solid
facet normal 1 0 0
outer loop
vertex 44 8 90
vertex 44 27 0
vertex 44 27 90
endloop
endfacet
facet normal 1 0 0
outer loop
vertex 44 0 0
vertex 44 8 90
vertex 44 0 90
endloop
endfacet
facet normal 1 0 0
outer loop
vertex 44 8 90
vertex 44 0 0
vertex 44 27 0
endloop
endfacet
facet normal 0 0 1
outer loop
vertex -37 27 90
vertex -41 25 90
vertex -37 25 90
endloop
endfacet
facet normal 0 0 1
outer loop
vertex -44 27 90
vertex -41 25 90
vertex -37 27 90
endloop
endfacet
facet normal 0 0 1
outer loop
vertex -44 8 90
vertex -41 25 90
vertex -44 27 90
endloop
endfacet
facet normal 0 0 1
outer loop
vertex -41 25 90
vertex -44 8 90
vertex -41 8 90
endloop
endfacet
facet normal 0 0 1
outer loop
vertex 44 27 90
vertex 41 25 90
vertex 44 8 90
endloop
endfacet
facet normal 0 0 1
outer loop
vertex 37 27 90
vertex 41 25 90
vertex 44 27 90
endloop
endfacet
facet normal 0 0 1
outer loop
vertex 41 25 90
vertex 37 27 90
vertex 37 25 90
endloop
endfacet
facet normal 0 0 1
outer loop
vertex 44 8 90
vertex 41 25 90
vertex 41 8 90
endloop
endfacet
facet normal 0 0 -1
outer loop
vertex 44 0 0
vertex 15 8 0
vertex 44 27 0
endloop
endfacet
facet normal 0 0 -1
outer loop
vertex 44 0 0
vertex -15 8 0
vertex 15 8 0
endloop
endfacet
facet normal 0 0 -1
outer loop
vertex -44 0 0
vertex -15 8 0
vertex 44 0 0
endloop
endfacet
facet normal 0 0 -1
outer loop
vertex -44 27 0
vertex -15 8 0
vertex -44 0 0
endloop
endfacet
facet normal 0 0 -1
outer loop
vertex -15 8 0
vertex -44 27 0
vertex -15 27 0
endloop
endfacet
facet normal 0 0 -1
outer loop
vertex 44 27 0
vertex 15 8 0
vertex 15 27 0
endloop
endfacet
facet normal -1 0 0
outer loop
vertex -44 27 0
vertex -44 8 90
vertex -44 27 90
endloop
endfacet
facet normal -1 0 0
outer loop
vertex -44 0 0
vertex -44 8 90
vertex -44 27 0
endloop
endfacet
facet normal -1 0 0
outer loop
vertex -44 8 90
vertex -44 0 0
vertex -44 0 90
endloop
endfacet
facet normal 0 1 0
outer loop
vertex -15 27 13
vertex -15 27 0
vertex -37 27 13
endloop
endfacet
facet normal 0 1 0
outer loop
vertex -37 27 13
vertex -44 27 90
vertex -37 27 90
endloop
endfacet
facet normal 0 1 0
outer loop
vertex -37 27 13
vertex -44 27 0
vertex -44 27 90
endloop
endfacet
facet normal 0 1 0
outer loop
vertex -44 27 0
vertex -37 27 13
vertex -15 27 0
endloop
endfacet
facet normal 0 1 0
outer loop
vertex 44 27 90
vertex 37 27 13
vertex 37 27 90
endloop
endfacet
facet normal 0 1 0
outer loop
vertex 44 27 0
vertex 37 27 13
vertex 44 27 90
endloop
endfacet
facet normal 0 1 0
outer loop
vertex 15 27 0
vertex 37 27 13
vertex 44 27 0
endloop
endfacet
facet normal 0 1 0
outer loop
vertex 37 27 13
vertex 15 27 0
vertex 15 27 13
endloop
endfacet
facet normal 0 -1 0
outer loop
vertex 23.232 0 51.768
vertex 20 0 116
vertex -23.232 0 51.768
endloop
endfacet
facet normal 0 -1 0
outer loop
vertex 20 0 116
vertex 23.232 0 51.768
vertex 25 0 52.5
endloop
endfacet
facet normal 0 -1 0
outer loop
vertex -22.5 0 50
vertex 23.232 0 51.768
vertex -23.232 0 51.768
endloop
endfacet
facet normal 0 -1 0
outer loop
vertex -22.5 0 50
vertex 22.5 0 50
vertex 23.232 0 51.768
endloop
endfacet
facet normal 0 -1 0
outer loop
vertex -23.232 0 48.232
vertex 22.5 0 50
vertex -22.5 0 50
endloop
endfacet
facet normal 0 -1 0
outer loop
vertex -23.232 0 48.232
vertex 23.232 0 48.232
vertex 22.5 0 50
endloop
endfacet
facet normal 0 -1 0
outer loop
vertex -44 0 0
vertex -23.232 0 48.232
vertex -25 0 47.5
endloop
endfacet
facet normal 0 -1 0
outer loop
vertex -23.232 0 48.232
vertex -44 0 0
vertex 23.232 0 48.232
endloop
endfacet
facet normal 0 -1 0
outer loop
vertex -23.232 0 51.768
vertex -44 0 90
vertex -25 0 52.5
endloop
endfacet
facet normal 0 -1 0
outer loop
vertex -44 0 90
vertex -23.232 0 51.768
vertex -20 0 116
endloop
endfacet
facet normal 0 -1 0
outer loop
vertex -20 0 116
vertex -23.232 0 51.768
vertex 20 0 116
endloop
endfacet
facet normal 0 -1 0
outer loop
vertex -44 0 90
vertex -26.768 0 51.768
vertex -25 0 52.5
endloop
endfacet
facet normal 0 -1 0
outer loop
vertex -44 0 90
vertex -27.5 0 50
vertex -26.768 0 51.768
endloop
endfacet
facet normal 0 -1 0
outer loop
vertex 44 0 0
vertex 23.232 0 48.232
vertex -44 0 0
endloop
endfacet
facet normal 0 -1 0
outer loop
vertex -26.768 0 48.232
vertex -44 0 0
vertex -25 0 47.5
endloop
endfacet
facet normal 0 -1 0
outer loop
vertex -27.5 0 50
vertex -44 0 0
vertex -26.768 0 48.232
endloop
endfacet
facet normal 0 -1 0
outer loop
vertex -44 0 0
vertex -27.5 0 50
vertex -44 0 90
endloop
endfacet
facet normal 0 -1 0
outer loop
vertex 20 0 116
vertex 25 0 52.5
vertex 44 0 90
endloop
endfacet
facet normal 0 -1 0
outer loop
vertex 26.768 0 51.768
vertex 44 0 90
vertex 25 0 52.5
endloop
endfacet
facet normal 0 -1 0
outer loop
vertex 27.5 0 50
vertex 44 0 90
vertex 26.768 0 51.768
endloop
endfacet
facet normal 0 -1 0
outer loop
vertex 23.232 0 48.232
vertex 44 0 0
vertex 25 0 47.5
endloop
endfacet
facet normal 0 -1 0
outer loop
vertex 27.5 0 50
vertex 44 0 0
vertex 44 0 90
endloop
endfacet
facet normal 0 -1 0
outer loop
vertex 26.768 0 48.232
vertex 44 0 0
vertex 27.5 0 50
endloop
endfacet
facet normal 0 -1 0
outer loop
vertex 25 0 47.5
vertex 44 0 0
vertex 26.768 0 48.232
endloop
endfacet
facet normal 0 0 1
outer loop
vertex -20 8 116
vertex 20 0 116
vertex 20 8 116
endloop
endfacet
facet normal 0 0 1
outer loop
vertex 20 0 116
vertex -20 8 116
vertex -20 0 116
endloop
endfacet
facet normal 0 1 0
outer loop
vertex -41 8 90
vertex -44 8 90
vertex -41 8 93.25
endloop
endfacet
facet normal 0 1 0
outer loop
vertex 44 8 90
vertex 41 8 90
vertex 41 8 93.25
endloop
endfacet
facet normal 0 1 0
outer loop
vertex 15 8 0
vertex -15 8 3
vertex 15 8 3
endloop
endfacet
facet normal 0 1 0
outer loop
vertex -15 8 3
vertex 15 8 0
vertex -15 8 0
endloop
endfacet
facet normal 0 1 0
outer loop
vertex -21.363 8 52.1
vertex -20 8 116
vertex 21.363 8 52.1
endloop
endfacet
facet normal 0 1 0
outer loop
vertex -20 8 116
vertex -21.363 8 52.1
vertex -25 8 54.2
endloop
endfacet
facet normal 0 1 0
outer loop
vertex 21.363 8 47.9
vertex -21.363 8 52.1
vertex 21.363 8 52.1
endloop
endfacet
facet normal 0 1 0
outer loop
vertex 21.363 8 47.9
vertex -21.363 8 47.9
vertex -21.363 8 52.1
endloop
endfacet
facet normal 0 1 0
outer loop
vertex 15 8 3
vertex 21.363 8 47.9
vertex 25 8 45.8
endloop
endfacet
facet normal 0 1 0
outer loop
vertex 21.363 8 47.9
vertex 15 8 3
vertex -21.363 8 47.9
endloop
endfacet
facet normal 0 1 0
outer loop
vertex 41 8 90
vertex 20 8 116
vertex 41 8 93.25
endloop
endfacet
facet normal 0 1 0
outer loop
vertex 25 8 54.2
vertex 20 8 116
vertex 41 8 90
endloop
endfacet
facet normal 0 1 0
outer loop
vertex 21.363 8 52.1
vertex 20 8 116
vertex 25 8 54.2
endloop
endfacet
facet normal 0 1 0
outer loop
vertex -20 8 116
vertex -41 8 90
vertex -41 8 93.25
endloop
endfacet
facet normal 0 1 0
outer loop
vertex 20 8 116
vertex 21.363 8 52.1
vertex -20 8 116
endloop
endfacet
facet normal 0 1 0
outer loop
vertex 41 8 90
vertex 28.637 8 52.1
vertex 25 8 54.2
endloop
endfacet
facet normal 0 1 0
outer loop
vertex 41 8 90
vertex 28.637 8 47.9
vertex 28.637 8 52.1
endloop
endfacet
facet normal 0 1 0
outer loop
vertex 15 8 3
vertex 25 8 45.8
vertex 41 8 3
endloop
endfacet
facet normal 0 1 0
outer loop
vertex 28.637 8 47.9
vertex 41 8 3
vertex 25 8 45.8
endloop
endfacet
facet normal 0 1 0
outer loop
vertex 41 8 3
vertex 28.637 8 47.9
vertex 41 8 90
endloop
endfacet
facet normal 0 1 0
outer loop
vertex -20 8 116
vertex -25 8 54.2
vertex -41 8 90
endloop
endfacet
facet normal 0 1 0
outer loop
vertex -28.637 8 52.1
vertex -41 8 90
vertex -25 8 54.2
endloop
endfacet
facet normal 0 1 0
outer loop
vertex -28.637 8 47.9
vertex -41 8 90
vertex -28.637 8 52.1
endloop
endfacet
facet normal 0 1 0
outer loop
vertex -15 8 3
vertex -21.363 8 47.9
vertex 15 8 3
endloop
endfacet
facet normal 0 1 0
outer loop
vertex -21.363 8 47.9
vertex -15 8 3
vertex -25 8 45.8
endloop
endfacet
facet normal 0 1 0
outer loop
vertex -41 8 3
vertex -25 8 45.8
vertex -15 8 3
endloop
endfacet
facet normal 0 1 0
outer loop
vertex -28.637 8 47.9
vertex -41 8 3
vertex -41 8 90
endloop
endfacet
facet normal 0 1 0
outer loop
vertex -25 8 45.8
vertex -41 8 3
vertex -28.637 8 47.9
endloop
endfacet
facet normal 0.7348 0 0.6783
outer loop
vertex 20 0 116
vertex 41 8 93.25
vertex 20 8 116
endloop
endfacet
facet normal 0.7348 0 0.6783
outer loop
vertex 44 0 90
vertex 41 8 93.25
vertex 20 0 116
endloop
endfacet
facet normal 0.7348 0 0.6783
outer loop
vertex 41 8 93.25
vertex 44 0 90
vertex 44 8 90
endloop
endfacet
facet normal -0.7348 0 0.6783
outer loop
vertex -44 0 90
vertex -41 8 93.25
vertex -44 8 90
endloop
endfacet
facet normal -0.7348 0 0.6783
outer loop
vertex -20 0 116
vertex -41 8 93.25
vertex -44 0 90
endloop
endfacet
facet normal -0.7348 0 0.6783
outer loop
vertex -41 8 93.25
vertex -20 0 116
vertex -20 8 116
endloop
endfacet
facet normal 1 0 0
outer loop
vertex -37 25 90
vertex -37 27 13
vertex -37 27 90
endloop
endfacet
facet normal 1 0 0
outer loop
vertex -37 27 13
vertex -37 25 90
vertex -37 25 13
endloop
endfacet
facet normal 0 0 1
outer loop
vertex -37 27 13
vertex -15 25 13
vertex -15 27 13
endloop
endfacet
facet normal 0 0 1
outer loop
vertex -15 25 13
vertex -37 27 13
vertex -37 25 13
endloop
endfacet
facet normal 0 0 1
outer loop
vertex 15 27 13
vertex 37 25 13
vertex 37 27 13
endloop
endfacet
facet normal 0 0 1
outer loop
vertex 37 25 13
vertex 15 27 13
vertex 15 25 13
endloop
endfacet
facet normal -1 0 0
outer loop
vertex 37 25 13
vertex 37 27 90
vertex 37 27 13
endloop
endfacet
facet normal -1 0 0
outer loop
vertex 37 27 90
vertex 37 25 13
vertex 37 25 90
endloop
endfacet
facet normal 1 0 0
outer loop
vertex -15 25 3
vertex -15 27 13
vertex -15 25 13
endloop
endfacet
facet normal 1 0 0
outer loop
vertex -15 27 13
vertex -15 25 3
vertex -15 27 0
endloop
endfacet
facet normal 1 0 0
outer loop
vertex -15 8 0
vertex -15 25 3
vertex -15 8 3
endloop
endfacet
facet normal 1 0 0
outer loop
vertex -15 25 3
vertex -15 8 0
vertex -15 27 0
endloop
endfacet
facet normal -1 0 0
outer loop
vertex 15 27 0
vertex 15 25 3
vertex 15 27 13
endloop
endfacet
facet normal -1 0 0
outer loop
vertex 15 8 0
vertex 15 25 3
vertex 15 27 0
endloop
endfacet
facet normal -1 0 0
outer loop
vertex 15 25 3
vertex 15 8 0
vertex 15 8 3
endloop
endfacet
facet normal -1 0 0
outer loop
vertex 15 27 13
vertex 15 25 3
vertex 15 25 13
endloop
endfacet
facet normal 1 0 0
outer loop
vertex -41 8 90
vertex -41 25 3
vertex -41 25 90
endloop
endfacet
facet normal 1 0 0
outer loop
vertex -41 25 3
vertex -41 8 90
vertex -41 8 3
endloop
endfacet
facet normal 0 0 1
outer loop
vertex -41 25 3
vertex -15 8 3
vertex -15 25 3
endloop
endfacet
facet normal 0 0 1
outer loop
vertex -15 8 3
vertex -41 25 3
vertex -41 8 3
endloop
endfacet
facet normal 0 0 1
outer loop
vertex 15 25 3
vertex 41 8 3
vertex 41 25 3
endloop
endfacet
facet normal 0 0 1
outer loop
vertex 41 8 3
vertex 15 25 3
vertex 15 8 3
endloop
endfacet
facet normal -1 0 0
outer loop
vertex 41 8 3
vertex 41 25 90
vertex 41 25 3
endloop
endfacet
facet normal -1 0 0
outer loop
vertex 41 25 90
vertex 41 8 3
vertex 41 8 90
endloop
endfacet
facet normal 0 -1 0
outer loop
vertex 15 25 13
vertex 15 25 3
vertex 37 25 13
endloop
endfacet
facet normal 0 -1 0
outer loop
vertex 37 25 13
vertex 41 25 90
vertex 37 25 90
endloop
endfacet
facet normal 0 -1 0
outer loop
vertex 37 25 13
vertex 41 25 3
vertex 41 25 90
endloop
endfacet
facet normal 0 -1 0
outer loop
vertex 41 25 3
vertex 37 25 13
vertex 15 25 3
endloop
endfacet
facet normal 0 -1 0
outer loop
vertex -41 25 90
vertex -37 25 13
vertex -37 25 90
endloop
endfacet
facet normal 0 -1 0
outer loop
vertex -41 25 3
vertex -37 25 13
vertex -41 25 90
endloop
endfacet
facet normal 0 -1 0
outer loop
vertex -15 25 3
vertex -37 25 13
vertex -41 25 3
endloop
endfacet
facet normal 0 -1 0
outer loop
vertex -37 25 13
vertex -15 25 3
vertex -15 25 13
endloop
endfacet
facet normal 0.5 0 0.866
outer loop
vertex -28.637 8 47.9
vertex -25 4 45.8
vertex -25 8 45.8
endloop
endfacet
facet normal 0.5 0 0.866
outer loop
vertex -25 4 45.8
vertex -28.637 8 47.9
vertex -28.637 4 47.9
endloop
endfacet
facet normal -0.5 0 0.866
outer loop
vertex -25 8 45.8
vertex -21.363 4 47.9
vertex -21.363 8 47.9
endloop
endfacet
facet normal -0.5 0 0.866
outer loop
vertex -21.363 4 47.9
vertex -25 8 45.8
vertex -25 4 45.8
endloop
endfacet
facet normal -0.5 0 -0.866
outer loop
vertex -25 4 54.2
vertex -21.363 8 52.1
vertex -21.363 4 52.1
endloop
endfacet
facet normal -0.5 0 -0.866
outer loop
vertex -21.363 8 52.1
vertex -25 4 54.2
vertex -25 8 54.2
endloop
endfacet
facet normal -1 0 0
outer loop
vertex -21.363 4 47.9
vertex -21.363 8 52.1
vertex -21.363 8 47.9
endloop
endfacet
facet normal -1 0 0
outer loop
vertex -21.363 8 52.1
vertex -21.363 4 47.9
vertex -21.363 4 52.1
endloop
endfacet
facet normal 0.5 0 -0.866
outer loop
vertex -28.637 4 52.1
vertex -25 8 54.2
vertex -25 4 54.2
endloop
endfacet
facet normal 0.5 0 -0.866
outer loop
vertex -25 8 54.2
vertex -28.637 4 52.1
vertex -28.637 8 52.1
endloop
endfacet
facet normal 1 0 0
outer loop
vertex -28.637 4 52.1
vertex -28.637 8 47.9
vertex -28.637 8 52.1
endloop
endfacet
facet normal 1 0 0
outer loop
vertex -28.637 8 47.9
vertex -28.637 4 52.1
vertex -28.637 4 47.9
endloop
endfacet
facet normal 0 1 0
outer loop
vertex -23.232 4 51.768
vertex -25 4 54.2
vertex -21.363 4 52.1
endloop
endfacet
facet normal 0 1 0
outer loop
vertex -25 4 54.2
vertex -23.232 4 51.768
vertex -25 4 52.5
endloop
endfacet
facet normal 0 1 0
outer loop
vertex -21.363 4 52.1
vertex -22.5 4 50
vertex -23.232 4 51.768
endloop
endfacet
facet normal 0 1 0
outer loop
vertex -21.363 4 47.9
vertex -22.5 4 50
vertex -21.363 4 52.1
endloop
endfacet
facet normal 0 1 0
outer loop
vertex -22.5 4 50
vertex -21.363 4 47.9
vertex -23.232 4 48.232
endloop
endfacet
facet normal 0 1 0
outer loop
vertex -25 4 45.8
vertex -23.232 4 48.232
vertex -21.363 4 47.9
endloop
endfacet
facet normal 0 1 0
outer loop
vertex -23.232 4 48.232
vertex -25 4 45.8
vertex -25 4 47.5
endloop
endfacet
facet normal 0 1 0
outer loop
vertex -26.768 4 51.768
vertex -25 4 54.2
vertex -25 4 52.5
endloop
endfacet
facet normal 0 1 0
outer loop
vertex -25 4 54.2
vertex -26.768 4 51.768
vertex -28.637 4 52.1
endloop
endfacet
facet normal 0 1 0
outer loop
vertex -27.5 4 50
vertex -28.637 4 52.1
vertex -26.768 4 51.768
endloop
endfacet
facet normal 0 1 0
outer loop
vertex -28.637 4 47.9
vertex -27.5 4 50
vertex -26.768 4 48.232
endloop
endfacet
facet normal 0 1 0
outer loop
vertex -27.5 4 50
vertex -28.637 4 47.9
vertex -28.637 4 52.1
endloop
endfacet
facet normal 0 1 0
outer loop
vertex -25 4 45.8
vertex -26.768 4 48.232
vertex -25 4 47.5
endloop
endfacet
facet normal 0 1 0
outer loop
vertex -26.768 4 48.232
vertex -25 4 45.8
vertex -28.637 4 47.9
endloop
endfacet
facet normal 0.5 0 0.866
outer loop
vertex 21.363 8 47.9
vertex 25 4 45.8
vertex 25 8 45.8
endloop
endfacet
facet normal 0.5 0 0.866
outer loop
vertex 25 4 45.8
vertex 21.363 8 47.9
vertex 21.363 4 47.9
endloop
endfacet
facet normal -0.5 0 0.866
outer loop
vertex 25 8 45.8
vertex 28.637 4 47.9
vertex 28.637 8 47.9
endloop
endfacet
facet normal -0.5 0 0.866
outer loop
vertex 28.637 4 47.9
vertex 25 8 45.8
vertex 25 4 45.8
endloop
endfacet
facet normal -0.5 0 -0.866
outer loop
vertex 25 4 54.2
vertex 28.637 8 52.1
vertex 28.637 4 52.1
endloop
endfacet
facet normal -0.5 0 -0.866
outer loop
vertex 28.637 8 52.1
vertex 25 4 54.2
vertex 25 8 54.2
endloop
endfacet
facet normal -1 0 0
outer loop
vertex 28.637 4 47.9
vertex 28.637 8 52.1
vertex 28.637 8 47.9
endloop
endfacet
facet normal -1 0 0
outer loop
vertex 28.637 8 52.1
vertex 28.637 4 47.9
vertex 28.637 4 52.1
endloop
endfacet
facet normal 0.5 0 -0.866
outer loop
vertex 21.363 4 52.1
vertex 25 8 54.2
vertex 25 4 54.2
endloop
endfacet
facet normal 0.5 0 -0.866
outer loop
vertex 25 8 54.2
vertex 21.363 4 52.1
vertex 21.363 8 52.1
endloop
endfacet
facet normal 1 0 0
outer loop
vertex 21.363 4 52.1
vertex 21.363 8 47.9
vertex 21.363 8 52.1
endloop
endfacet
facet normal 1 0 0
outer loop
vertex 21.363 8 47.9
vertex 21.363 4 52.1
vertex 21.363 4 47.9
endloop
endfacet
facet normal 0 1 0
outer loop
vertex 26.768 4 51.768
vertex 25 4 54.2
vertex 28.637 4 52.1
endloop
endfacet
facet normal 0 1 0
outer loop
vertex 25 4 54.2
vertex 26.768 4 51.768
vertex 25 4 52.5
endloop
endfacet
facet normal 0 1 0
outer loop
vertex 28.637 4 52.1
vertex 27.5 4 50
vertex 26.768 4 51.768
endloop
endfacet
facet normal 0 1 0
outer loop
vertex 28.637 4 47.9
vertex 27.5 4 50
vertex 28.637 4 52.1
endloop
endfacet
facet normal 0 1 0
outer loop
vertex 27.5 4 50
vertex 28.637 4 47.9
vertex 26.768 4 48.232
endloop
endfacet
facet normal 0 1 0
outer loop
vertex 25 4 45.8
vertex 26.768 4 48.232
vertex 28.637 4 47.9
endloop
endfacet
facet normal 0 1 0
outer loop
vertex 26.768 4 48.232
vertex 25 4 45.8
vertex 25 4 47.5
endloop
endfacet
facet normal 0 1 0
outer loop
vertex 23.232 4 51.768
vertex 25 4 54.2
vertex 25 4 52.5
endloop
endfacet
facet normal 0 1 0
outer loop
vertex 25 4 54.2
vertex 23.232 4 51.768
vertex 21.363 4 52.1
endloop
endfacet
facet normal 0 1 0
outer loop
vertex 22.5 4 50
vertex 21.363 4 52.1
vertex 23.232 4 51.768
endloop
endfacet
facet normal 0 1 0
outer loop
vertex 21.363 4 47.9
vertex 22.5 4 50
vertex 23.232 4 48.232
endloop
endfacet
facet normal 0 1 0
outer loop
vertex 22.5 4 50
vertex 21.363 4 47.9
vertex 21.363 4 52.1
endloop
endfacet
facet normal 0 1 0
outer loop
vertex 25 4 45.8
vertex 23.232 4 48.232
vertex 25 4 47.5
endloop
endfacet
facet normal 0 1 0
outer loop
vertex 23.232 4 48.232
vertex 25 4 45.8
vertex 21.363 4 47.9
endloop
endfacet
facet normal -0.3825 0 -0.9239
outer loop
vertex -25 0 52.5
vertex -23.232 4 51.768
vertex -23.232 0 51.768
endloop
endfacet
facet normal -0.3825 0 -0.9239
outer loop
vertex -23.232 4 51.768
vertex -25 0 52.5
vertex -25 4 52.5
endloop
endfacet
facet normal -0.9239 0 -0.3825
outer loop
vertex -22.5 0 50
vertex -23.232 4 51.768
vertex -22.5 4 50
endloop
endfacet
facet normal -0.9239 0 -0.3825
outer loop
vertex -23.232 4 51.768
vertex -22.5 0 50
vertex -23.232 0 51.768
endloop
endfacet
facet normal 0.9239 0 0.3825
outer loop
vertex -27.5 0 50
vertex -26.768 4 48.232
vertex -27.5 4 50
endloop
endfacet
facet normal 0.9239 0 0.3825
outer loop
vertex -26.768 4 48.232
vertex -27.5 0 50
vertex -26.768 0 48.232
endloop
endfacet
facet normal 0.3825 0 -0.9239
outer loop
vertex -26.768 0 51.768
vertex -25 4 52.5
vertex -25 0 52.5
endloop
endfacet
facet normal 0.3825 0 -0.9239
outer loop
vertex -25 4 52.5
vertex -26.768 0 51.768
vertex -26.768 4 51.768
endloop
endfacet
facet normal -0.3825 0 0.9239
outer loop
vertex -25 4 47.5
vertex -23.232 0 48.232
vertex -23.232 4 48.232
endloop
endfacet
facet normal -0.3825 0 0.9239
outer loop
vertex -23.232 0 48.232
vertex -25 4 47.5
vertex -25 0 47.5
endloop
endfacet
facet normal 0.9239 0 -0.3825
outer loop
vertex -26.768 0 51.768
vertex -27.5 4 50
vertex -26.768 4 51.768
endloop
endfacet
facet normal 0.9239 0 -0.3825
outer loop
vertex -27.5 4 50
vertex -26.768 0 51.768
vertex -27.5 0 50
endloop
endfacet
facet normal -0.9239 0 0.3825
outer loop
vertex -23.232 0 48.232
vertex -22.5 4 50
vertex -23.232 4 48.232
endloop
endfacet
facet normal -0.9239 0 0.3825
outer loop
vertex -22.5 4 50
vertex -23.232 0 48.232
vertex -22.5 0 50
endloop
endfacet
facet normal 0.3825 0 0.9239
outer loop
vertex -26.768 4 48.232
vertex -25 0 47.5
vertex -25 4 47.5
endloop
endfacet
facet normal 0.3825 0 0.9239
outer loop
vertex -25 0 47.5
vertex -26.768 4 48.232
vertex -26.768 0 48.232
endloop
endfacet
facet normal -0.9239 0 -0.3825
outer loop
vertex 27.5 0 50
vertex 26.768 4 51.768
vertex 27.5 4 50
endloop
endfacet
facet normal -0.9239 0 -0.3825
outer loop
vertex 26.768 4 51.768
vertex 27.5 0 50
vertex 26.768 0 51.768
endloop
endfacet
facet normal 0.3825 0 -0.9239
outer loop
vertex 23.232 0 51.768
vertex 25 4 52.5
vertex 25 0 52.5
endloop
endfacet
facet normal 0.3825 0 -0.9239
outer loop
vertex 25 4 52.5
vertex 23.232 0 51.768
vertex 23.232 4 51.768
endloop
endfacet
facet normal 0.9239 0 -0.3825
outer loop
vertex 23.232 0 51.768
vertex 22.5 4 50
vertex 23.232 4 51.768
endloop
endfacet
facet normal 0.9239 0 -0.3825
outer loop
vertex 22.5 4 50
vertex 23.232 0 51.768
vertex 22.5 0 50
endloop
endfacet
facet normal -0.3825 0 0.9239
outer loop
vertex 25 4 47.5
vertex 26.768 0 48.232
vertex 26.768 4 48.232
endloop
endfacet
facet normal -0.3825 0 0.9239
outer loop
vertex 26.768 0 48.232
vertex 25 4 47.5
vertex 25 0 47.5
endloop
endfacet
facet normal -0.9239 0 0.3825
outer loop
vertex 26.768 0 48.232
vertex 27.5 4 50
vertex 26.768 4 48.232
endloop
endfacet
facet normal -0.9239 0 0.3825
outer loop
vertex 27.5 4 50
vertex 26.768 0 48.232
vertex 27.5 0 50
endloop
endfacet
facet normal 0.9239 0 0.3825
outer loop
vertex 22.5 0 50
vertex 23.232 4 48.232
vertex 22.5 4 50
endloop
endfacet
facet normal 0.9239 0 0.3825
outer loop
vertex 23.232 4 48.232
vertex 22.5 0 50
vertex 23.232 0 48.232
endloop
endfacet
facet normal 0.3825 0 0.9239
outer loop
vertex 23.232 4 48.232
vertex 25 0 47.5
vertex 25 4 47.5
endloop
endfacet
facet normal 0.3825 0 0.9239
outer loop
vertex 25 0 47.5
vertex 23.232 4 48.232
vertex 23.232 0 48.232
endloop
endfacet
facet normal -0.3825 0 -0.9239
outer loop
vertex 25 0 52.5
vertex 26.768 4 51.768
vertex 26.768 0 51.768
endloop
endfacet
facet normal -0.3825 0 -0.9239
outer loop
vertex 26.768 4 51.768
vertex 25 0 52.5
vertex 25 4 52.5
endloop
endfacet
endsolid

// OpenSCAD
include <../config.scad>

tel_l = 170;
tel_lg = 82;
tel_e = 17;
tel_e2 = 5;
e = 2;

tel_ecran_lg = tel_lg-8;
tel_ecran_h = tel_l-5;

module tel(l = tel_l, ecran = true){
    translate([-tel_lg/2, 0,0])cube([tel_lg, tel_e, l]);
    
    if(ecran){
        translate([-tel_ecran_lg/2,tel_e2,10])cube([tel_ecran_lg, 20, tel_ecran_h]);
        translate([-15, 0, -5])cube([30, 30, 20]);
        //translate([-tel_lg/2-2*e,tel_e-tel_e2,68])cube([tel_ecran_lg, tel_e2, 40]);
    }
}


module test(){
    difference(){
        translate([-tel_lg/2-2, -2,0])cube([tel_lg+4, tel_e+4, 10]);
        tel();
    }
}

module full_support(){
    difference(){
        translate([-tel_lg/2-e, -e,0])cube([tel_lg+2*e, tel_e+2*e, tel_l+2*e]);
        translate([0,0, e])tel(tel_l+2*e);
        
    }
}

module support_venti(lg, l){
    e1 = 2;
    e2 = 3;
    e3 = 2;
    l1 = 12;
    difference(){
        union(){
            cube([l1, e1 + e2 + e3, lg]);
            cube([l, e1, lg]);
        }
        translate([4, e1, -1])cube([l1-4-0.2, e2, lg + 2]);
    }
}

module support_voiture(){
    l = 34;
    l2 = 60;
    difference(){
        translate([0, 0, l2]) rotate([0,180,0])full_support();
        translate([-100, -100, -200]) cube([200,200,200]);
        translate([-10, 0, l2-10]) cube([20,20,20]);
    }
    for(i = [-1,1]){
        translate([i*20, -l, 0]) rotate([90, 0, 90])support_venti(5, l);
    }
    
    translate([-20, 13, 48]) cube([40,2,1]);
}







module support(h, e){
    r2 = 10;
    x = 36/2+e-r2;
    //rotate([-90,0,0]) cylinder(h, r = lg/2, center = true);
    rotate([0,0,angle_tracteur])hull(){
        translate([x,  x, 0]) cylinder(h, r = r2, center = true);
        translate([x,  -x, 0]) cylinder(h, r = r2, center = true);
        translate([-x,  x, 0]) cylinder(h, r = r2, center = true);
        translate([-x,  -x, 0]) cylinder(h, r = r2, center = true);
        %cylinder(r=36/2, h, center = true);
        
    }
}

module support_rams(){
    h2 = 90;
    h3 = 115;
    y_support = 40;
    e = 4;
    e2 = 8;
    de = 3;
     difference(){
         union(){
            translate([-tel_lg/2-de,0,0])cube([tel_lg+2*de, tel_e+10, h2]);
            hull(){
                translate([-tel_lg/2-de,0,0])cube([tel_lg+2*de,e2, h2]);
                translate([-20,0,h3])cube([40,e2, 1]);
            }

        }
        mirror([0,1,0]) translate([0,-e2,3]) rotate([0,0,180]) tel();
        
        translate([-100,y_support,-1]) cube([200, 2, 30]);
        translate([-100,-100,-10]) cube([200, 200, 10]);
        
        for(i=[-1,1]){
           translate([i*25,0,50]) rotate([90,0,0])cylinder(100, r = 2.5, center = true);
           translate([i*25,e2+1,50]) rotate([90,30,0]) nut(4,5);
           // %translate([i*25,e2+1,50]) rotate([90,30,0]) nut(4);
            
        }
        
        
        

        
    }
    //%mirror([0,1,0])translate([0,-6,3])  rotate([0,0,180]) tel();
        
    
}



//full_support();
//support_voiture();

support_rams();
